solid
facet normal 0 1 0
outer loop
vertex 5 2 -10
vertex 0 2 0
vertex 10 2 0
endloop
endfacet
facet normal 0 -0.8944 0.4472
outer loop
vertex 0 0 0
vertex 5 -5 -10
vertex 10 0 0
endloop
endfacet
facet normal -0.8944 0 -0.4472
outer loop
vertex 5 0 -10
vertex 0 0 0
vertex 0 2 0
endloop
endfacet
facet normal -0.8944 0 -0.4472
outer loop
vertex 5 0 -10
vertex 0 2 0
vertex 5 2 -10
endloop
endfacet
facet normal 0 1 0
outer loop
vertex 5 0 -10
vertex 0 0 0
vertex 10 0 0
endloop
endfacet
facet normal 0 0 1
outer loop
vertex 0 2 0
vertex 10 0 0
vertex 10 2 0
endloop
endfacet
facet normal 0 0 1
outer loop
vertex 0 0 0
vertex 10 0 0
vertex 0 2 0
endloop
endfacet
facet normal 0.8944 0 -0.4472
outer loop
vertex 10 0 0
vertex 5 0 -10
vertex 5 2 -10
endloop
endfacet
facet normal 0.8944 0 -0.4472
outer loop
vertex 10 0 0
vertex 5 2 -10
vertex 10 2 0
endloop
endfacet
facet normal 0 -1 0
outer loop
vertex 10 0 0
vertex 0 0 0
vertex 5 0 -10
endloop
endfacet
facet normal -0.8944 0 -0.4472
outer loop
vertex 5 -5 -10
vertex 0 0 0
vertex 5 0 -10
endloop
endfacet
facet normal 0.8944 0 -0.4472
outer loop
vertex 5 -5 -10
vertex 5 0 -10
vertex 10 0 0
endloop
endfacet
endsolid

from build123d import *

# Parameters (mm, degrees)
F2_DEPTH = 2
F3_DEPTH = 10
F4_DEPTH = 10.001


with BuildPart() as f2:
    # F0 (on Front) → F2 (new body)
    with BuildSketch(Plane.XZ):
        Polygon((5, 0), (0, 0), (5, -10), (10, 0), align=None)
        Polygon((1.6180339887, -1), (5, -1), (8.3819660113, -1), (5, -7.7639320225), align=None, mode=Mode.SUBTRACT)
        Polygon((8.3819660113, -1), (5, -1), (1.6180339887, -1), (5, -7.7639320225), align=None)
    extrude(amount=-F2_DEPTH)


with BuildPart() as f3:
    # F0 (on Front) → F3 (new body)
    with BuildSketch(Plane.XZ):
        Polygon((5, 0), (0, 0), (5, -10), (10, 0), align=None)
        Polygon((1.6180339887, -1), (5, -1), (8.3819660113, -1), (5, -7.7639320225), align=None, mode=Mode.SUBTRACT)
        Polygon((8.3819660113, -1), (5, -1), (1.6180339887, -1), (5, -7.7639320225), align=None)
    extrude(amount=F3_DEPTH)

    # F1 (on Right) → F4 (cut, through all)
    with BuildSketch(Plane.YZ):
        Polygon((-4.9999888349, -10), (0, 0), (-20.0761053711, 0), (-20.0761053711, -10), (-15, -10), align=None)
    extrude(amount=F4_DEPTH, mode=Mode.SUBTRACT)


solid = Compound([f2.part, f3.part])
